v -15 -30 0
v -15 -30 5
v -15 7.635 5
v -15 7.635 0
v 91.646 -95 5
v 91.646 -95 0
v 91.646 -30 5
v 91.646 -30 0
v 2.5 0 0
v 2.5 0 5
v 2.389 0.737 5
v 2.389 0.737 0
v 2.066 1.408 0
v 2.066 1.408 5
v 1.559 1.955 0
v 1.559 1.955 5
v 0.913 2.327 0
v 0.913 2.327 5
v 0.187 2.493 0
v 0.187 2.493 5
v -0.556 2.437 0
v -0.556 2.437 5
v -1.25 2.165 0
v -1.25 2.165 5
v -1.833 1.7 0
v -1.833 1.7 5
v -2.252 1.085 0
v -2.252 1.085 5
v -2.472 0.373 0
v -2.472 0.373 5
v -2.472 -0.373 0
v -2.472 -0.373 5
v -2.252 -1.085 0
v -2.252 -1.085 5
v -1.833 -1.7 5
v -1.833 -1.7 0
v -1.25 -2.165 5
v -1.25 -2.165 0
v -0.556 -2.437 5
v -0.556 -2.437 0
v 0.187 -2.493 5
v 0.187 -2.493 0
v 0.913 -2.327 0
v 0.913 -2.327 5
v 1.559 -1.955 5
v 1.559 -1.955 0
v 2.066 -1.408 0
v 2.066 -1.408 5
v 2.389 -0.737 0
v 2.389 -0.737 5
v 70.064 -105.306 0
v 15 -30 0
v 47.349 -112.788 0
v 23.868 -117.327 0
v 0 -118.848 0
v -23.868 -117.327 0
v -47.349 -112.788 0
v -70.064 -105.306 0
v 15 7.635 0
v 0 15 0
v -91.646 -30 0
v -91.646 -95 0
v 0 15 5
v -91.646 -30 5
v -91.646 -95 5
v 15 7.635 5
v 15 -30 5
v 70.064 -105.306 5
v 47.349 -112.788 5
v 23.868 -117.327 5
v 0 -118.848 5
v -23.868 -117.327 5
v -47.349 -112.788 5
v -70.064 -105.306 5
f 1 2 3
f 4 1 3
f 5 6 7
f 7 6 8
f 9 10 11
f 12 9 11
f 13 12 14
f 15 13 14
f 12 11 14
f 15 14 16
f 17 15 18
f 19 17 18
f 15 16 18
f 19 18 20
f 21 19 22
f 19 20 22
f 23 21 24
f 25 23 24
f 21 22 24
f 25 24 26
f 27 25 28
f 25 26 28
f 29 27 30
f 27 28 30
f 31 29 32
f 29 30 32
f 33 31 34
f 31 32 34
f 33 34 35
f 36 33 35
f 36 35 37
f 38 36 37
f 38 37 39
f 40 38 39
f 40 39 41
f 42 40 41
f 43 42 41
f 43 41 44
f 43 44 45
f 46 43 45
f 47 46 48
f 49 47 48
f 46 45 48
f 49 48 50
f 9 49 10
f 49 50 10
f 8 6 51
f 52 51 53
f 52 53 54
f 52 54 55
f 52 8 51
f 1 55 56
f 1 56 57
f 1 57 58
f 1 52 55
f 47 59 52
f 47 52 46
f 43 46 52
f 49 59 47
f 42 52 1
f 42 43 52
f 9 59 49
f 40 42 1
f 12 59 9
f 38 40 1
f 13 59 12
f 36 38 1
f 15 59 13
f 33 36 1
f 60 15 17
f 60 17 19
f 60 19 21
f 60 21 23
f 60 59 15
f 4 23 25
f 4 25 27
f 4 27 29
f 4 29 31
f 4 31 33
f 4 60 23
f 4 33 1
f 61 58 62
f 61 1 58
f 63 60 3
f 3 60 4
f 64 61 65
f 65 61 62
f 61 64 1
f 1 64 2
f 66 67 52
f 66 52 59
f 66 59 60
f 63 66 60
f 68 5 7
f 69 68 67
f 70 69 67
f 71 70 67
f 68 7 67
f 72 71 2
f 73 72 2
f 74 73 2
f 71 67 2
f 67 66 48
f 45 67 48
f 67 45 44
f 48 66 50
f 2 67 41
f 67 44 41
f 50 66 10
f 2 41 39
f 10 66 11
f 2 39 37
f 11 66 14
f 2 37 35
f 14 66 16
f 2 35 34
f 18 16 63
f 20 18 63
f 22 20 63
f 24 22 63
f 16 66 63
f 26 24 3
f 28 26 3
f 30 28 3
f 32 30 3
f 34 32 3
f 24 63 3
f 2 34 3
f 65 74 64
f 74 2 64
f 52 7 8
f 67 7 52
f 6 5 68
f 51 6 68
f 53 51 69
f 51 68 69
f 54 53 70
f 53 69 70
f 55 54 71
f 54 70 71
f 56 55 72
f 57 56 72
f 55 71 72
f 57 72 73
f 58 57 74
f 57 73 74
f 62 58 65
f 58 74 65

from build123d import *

# Parameters (mm, degrees)
P_IDAT_VYSUNUT_M1_DEPTH  = 5
SKICA2_R                 = 2.5
ODEBRAT_VYSUNUT_M1_DEPTH = 5
ODEBRAT_VYSUNUT_M2_DEPTH = 5
P_IDAT_VYSUNUT_M2_DEPTH  = 5


with BuildPart() as part:
    # Skica1 → Přidat vysunutím1 (new body)
    with BuildSketch(Plane.XY):
        Polygon((-91.646058289, -95), (91.646058289, -95), (91.646058289, -30), (0, 15), (-91.646058289, -30), align=None)
    extrude(amount=P_IDAT_VYSUNUT_M1_DEPTH)

    # Skica2 → Odebrat vysunutím1 (cut)
    with BuildSketch(Plane.XY.offset(5)):
        Circle(SKICA2_R)
    extrude(amount=-ODEBRAT_VYSUNUT_M1_DEPTH, mode=Mode.SUBTRACT)

    # Skica3 → Odebrat vysunutím2 (cut)
    with BuildSketch(Plane.XY.offset(5)):
        Polygon((91.646058289, -30), (15, -30), (15, 7.634707781), align=None)
        Polygon((-15, 7.634707781), (-91.646058289, -30), (-15, -30), align=None)
    extrude(amount=-ODEBRAT_VYSUNUT_M2_DEPTH, mode=Mode.SUBTRACT)

    # Skica4 → Přidat vysunutím2 (add)
    with BuildSketch(Plane.XY.offset(5)):
        with BuildLine():
            Line((-91.646058289, -95), (91.646058289, -95))
            ThreePointArc((91.646058289, -95), (0, -118.848037221), (-91.646058289, -95))
        make_face()
    extrude(amount=-P_IDAT_VYSUNUT_M2_DEPTH)


solid = part.part
